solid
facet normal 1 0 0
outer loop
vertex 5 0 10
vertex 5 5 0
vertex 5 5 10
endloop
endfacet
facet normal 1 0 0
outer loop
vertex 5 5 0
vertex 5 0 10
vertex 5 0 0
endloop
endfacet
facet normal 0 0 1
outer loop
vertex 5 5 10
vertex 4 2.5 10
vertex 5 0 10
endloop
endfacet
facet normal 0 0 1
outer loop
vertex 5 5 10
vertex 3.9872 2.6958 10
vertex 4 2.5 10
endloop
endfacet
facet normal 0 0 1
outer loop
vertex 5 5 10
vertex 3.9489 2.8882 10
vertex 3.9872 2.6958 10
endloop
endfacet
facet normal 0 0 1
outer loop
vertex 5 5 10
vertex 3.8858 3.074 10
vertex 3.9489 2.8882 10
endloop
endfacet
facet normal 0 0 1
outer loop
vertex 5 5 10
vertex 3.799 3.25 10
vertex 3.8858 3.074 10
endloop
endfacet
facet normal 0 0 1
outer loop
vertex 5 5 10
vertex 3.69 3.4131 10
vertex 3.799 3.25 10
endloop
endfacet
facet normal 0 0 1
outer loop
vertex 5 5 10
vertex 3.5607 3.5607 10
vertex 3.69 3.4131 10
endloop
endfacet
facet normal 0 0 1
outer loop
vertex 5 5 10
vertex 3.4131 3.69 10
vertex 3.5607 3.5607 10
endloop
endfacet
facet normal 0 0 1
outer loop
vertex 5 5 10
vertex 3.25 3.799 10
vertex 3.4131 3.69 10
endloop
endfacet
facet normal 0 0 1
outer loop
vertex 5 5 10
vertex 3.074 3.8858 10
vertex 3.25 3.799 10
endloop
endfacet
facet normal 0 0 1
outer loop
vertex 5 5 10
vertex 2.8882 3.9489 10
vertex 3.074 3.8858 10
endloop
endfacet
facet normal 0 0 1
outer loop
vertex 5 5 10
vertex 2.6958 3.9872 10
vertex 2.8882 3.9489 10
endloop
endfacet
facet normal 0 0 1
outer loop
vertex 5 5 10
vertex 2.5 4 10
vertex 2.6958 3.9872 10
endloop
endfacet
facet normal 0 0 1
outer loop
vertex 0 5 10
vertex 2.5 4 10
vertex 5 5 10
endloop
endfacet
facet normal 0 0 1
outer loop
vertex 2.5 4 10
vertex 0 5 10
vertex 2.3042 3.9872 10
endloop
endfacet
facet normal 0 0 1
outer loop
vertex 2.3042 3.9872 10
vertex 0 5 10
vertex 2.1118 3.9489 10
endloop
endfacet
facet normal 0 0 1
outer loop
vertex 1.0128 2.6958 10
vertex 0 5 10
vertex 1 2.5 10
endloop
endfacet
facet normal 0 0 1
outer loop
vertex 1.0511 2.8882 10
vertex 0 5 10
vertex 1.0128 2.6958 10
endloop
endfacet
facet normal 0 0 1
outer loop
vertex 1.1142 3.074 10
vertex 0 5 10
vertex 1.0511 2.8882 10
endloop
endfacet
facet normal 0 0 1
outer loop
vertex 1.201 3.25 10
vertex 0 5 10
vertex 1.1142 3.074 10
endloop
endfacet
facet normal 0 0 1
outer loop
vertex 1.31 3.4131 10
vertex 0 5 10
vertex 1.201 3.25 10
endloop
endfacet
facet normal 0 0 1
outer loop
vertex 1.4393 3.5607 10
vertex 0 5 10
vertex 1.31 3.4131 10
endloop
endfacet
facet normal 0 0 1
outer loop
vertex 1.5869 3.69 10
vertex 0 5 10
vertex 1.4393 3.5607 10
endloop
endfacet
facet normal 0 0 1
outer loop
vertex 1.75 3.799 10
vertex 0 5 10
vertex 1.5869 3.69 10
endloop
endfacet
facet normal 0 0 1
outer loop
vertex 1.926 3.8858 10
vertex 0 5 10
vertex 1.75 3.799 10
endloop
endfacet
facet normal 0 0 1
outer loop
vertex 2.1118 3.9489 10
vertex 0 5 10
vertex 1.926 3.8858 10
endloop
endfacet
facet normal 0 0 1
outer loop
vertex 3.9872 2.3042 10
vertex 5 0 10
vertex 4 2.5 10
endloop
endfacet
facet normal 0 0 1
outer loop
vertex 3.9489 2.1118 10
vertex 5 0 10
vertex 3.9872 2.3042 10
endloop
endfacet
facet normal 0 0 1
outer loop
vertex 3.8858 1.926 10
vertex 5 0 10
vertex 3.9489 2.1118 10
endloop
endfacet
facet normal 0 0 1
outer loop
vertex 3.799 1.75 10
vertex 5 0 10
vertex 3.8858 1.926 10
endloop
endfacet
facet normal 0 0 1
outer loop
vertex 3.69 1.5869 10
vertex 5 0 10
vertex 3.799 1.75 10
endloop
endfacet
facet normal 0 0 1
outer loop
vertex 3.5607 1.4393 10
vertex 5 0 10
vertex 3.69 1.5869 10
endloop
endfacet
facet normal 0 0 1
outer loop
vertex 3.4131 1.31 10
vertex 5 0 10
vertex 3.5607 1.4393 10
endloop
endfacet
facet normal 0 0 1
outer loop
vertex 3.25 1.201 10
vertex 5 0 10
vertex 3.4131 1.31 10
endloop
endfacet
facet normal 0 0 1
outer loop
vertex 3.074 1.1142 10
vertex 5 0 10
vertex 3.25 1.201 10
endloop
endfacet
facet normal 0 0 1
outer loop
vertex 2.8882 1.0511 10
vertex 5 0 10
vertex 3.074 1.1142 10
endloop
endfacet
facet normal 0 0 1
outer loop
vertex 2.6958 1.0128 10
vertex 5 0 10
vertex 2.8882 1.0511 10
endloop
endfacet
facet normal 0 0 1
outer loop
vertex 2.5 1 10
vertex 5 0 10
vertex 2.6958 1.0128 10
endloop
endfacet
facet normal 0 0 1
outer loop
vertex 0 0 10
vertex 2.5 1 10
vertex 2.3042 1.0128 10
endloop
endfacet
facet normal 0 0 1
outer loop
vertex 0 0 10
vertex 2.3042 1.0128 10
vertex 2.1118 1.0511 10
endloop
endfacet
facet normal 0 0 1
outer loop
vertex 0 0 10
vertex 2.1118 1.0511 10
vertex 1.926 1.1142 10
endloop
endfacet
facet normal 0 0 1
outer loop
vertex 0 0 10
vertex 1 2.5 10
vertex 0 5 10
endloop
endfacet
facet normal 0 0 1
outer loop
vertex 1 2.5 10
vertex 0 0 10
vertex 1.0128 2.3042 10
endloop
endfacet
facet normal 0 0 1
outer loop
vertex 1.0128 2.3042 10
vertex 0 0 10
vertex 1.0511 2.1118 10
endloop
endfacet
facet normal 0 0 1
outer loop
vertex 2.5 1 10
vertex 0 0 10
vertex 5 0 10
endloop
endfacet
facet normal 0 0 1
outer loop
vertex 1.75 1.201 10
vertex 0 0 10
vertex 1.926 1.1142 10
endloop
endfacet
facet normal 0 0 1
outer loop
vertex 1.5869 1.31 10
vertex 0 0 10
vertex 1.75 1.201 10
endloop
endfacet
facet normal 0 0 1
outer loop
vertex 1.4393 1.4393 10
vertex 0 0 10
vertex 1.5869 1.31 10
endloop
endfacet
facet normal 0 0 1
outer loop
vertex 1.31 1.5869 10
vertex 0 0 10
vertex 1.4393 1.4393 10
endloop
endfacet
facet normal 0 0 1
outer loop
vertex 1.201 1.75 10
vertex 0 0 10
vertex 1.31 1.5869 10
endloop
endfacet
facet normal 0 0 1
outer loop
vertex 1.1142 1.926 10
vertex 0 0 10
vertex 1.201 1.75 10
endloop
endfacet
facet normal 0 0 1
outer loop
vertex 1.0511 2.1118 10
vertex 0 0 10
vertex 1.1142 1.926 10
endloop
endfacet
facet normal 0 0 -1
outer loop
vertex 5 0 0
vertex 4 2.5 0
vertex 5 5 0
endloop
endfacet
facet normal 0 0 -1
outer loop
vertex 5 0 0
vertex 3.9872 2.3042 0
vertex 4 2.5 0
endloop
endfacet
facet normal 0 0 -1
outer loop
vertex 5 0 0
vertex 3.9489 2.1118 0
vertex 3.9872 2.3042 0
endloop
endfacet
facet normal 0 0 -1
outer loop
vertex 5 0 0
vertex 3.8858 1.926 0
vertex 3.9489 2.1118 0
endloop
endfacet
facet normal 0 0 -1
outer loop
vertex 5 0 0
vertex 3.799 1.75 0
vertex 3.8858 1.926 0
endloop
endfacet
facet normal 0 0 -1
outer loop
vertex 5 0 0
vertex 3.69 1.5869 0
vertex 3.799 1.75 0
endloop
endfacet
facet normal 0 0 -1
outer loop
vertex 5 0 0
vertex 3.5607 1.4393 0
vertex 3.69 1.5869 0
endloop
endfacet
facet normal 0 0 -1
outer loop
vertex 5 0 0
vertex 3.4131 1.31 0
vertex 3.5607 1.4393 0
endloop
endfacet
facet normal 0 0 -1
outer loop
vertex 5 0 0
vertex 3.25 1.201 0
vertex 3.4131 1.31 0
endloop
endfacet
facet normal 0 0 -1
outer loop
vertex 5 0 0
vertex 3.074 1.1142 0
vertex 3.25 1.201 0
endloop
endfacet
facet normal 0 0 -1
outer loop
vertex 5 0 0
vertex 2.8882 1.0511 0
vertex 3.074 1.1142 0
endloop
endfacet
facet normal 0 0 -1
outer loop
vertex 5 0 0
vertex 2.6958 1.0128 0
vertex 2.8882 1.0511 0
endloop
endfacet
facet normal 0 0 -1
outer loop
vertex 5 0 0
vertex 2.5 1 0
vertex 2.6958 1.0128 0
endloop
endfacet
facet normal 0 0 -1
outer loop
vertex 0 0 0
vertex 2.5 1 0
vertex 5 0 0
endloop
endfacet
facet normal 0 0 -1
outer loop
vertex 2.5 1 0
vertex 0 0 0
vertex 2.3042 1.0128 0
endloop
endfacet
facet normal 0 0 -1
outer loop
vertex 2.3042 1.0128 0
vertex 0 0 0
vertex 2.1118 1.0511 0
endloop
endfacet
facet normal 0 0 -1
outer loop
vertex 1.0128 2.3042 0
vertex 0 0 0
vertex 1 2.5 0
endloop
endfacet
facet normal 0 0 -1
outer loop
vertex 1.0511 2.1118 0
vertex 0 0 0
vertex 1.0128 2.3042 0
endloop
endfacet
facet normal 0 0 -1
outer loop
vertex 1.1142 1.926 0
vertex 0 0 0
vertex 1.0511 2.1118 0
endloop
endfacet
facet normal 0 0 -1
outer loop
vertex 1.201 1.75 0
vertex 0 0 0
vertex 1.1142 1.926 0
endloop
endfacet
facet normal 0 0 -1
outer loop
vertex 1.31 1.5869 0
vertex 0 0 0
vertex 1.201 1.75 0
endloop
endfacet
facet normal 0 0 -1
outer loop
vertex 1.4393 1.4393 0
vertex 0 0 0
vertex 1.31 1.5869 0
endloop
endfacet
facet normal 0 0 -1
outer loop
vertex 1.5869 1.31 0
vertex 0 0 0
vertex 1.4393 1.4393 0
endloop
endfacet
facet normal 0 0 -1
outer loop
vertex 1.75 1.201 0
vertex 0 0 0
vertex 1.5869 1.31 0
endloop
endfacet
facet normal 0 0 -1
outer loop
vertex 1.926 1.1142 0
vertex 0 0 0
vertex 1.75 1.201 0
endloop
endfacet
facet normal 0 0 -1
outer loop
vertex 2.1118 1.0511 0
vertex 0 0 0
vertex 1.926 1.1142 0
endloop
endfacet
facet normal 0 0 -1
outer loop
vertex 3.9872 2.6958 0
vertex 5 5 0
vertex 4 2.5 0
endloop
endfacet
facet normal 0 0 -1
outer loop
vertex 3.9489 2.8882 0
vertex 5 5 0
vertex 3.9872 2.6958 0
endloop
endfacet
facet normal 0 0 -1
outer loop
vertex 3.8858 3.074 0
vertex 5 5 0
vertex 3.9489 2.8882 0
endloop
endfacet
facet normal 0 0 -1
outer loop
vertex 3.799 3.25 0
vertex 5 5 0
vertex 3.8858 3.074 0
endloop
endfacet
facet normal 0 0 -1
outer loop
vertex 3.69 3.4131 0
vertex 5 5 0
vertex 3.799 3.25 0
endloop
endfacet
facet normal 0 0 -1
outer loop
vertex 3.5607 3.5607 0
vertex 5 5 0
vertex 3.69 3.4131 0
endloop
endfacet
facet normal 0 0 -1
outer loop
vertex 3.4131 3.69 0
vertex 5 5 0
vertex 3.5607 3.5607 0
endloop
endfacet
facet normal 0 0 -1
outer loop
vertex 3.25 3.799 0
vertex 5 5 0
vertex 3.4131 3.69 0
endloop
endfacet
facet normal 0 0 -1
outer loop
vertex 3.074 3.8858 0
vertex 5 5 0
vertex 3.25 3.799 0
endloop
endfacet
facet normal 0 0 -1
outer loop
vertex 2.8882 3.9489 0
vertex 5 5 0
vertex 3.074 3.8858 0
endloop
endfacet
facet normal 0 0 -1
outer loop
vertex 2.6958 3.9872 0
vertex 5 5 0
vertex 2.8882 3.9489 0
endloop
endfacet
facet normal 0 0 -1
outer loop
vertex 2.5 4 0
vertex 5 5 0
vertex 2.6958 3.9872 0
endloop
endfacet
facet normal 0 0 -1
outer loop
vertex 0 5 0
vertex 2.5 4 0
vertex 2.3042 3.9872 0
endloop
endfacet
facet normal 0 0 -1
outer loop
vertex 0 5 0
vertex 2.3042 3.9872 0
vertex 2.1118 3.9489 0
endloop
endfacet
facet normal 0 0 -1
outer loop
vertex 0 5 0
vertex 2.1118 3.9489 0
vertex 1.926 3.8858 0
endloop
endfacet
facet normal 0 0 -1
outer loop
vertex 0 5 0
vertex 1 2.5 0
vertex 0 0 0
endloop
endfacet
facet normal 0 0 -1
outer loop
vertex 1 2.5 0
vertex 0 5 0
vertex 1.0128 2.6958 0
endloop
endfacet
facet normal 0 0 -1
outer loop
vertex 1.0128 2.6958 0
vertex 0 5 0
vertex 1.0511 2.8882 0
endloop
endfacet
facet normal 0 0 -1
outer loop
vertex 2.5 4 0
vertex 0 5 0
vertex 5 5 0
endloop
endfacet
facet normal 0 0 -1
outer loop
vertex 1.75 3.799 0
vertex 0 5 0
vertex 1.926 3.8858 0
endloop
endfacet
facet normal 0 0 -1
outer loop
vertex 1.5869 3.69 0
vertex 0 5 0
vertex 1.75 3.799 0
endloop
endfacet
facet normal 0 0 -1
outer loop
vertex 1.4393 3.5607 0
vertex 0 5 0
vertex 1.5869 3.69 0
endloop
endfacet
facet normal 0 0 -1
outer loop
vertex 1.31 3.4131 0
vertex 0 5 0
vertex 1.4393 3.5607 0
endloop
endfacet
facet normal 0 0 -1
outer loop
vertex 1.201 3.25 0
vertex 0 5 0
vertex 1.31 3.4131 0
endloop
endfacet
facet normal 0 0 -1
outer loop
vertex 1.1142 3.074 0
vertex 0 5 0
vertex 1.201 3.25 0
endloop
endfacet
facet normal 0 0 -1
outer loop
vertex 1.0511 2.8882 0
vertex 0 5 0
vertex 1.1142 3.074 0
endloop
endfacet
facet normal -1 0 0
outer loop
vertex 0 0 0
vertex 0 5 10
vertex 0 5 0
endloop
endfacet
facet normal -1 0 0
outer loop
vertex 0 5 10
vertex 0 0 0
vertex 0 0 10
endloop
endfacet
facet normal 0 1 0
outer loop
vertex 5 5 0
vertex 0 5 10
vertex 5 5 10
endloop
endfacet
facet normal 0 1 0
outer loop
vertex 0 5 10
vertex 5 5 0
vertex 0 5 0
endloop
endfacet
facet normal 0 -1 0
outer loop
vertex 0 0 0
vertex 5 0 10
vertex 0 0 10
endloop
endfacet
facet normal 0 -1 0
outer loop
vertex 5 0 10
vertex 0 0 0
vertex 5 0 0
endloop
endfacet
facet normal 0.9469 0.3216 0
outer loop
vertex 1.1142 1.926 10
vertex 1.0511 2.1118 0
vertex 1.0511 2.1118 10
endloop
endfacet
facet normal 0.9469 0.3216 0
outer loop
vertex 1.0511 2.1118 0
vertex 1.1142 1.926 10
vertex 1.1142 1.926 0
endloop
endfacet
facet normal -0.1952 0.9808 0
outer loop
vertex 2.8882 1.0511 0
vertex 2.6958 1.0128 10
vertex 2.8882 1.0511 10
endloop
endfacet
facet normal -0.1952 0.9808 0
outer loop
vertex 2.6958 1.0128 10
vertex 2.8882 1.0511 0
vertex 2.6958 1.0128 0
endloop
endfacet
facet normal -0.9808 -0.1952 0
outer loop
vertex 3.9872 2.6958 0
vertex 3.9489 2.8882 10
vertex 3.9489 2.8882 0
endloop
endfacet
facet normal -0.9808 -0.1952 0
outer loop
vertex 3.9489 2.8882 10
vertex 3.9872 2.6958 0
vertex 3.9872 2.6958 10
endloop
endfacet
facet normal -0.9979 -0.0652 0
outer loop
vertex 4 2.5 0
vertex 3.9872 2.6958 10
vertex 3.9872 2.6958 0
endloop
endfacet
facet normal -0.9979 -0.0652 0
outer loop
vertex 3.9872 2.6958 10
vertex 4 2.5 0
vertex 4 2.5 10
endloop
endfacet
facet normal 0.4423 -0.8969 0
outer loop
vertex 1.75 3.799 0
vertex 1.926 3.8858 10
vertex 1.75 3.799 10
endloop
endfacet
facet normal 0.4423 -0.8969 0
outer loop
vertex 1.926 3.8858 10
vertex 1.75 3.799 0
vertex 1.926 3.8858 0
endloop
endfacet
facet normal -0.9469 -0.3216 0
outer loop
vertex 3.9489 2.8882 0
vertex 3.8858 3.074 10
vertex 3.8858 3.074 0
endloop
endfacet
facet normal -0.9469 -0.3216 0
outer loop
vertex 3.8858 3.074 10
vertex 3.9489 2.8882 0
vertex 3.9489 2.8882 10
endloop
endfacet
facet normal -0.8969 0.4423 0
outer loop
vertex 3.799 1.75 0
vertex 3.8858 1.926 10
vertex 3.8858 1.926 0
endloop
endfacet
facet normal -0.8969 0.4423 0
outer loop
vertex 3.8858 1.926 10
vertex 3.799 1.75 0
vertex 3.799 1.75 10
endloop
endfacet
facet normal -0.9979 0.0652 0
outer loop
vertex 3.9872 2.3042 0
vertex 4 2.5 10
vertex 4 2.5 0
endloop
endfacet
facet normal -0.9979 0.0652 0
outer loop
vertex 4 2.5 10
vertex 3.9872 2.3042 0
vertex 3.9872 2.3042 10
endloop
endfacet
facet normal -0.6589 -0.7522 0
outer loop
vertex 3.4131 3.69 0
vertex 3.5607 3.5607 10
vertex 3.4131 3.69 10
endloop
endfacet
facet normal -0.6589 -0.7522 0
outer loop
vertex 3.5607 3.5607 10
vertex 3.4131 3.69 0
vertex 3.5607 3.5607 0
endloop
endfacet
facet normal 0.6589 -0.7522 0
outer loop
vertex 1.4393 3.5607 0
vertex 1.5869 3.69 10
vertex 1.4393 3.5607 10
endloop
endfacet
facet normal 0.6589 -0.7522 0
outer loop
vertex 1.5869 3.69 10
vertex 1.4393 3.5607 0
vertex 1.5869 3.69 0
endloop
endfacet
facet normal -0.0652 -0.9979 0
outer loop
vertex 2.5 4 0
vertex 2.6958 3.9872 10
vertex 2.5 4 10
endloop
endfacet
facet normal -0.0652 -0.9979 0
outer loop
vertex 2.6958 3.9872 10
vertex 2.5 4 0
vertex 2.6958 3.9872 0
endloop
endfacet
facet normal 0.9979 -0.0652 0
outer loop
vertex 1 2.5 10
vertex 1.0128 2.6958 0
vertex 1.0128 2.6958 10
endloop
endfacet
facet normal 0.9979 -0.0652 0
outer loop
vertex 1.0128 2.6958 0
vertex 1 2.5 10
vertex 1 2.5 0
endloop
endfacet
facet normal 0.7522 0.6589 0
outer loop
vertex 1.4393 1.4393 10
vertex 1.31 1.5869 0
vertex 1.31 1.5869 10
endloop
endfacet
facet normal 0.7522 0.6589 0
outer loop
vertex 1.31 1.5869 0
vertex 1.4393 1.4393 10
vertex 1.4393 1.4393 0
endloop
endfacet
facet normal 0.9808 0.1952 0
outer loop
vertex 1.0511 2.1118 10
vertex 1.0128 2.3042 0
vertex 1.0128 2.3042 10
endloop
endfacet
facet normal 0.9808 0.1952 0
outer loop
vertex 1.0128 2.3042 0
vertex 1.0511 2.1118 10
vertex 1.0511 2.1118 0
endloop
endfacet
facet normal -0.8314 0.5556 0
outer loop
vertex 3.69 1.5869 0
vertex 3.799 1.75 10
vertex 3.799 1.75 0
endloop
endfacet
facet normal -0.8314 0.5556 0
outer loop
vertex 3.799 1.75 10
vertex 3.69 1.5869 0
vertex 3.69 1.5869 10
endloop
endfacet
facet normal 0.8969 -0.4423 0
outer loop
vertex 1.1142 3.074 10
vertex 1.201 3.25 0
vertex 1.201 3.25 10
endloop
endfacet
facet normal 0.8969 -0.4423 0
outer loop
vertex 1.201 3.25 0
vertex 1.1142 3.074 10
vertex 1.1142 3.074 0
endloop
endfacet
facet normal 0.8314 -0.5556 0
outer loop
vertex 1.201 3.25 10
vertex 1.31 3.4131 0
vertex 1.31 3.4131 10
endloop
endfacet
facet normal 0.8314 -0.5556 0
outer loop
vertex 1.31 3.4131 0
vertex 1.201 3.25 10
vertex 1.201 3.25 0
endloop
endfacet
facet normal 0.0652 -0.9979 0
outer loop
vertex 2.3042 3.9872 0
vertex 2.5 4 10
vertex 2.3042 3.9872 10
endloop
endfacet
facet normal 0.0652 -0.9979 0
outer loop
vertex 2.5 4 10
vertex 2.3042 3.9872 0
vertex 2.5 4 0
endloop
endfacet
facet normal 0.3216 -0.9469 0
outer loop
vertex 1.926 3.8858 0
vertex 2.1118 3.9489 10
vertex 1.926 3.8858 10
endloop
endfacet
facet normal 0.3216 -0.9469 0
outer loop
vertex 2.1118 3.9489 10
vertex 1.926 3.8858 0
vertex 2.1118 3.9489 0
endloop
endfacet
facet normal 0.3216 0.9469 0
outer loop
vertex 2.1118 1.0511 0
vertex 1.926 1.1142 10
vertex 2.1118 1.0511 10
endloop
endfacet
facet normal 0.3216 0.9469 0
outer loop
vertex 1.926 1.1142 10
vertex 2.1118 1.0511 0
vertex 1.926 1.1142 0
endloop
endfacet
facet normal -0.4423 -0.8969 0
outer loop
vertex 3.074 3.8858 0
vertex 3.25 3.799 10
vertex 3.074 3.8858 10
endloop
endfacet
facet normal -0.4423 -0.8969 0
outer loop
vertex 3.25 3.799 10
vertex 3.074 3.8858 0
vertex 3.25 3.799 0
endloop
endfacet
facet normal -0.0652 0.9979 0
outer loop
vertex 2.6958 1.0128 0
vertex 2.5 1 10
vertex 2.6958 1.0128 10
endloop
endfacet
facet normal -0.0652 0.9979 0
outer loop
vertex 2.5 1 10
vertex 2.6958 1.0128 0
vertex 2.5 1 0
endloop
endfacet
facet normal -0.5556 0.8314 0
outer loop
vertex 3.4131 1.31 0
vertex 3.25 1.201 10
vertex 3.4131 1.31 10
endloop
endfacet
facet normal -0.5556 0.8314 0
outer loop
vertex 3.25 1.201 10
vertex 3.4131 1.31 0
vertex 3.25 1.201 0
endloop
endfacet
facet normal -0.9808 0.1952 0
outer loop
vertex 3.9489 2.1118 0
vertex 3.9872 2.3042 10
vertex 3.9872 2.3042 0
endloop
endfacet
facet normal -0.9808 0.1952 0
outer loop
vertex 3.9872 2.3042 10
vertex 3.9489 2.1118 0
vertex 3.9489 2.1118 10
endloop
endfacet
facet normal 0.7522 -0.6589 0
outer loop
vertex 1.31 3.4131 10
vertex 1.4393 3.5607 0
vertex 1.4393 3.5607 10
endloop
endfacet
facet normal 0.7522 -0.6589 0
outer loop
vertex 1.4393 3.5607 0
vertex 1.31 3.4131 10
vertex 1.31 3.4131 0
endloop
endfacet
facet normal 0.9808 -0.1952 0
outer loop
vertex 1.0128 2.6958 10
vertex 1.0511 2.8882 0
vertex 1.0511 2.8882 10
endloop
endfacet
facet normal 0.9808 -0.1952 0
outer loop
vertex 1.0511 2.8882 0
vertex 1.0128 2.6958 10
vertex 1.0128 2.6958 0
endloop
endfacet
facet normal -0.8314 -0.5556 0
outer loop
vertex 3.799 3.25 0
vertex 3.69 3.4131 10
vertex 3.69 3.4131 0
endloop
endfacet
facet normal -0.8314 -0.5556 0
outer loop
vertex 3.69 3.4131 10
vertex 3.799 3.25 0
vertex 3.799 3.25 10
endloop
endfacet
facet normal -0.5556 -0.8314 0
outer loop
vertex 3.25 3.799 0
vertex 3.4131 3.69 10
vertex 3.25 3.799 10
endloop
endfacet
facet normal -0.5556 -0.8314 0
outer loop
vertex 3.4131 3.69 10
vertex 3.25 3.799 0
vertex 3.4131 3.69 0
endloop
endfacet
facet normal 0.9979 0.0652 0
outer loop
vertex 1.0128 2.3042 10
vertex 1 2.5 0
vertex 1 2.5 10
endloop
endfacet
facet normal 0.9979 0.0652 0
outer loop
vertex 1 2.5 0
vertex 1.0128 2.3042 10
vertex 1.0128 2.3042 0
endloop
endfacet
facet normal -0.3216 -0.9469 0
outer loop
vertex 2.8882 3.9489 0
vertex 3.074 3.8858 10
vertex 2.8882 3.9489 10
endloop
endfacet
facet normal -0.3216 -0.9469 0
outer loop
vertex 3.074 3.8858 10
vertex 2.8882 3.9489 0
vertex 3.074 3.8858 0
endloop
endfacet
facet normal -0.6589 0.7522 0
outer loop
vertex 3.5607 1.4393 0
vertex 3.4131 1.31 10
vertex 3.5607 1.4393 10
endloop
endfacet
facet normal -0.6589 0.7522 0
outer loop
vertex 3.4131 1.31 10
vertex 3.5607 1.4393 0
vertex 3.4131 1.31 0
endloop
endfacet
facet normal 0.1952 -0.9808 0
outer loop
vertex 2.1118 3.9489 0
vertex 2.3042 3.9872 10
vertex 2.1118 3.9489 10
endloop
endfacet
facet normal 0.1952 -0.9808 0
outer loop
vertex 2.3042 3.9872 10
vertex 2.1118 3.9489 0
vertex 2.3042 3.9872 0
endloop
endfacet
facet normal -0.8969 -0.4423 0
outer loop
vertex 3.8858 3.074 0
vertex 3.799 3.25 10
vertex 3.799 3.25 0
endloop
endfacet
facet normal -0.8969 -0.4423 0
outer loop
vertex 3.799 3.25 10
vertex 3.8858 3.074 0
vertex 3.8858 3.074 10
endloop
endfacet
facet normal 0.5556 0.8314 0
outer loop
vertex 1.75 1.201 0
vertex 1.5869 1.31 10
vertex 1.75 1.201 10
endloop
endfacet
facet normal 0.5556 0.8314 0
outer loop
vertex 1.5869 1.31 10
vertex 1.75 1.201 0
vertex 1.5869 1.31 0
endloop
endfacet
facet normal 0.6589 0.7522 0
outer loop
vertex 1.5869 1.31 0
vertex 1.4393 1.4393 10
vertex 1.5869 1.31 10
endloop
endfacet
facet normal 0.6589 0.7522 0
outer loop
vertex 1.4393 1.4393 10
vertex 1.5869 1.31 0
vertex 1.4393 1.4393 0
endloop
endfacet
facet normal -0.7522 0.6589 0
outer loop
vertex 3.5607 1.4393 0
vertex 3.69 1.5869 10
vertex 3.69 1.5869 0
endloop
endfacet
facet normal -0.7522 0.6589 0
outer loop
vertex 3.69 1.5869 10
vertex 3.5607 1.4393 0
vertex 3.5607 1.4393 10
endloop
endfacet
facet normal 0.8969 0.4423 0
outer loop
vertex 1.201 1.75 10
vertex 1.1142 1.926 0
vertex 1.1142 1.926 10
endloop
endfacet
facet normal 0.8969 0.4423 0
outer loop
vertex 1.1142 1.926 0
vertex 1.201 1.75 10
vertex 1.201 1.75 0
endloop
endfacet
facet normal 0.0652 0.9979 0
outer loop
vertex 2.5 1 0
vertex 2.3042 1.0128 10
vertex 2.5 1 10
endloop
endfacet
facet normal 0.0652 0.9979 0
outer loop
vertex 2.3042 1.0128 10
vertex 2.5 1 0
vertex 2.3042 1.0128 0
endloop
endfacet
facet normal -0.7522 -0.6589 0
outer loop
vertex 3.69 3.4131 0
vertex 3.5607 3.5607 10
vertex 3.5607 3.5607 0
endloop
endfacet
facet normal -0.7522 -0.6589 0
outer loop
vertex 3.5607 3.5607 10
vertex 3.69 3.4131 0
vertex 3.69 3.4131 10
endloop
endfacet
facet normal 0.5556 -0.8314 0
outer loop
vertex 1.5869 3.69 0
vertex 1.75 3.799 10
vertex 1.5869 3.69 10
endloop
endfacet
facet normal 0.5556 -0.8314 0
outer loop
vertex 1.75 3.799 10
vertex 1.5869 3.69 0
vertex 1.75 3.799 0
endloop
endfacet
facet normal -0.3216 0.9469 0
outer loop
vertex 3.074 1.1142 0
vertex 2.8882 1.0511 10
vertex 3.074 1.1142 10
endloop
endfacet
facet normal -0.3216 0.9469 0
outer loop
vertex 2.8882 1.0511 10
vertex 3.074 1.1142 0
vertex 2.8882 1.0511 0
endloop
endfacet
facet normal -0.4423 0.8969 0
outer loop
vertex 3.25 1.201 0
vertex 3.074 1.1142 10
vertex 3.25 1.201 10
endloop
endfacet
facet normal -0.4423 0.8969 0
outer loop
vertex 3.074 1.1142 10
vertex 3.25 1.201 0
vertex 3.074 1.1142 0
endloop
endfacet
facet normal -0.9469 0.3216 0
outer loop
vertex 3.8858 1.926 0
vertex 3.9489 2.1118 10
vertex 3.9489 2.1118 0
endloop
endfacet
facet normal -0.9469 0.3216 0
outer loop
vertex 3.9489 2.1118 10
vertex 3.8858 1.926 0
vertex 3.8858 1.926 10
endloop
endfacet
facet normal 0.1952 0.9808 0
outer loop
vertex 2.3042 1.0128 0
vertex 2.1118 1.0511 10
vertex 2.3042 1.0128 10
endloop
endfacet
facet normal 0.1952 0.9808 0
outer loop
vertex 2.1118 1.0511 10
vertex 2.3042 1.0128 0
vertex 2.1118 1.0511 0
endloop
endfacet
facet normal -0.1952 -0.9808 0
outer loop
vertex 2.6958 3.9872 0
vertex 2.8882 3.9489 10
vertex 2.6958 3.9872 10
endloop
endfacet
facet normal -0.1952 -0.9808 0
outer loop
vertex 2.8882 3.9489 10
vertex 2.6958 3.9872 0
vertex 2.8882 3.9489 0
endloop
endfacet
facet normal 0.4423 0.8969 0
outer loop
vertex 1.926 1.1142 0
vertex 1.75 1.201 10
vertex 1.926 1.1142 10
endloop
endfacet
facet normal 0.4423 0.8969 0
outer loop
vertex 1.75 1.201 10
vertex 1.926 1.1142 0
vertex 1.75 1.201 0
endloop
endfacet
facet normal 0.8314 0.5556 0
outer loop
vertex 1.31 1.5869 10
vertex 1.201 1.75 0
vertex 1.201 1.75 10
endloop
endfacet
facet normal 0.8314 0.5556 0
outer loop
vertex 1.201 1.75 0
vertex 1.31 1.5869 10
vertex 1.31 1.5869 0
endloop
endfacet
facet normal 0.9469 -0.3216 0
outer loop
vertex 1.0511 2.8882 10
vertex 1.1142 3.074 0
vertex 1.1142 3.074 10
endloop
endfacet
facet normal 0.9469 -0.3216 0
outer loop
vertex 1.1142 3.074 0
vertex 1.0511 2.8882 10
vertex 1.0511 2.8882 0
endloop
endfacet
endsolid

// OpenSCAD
$fn=48;
difference(){
	cube([5,5,10]);
	translate([2.5,2.5,0]) cylinder(h=12, r=1.5);
}
